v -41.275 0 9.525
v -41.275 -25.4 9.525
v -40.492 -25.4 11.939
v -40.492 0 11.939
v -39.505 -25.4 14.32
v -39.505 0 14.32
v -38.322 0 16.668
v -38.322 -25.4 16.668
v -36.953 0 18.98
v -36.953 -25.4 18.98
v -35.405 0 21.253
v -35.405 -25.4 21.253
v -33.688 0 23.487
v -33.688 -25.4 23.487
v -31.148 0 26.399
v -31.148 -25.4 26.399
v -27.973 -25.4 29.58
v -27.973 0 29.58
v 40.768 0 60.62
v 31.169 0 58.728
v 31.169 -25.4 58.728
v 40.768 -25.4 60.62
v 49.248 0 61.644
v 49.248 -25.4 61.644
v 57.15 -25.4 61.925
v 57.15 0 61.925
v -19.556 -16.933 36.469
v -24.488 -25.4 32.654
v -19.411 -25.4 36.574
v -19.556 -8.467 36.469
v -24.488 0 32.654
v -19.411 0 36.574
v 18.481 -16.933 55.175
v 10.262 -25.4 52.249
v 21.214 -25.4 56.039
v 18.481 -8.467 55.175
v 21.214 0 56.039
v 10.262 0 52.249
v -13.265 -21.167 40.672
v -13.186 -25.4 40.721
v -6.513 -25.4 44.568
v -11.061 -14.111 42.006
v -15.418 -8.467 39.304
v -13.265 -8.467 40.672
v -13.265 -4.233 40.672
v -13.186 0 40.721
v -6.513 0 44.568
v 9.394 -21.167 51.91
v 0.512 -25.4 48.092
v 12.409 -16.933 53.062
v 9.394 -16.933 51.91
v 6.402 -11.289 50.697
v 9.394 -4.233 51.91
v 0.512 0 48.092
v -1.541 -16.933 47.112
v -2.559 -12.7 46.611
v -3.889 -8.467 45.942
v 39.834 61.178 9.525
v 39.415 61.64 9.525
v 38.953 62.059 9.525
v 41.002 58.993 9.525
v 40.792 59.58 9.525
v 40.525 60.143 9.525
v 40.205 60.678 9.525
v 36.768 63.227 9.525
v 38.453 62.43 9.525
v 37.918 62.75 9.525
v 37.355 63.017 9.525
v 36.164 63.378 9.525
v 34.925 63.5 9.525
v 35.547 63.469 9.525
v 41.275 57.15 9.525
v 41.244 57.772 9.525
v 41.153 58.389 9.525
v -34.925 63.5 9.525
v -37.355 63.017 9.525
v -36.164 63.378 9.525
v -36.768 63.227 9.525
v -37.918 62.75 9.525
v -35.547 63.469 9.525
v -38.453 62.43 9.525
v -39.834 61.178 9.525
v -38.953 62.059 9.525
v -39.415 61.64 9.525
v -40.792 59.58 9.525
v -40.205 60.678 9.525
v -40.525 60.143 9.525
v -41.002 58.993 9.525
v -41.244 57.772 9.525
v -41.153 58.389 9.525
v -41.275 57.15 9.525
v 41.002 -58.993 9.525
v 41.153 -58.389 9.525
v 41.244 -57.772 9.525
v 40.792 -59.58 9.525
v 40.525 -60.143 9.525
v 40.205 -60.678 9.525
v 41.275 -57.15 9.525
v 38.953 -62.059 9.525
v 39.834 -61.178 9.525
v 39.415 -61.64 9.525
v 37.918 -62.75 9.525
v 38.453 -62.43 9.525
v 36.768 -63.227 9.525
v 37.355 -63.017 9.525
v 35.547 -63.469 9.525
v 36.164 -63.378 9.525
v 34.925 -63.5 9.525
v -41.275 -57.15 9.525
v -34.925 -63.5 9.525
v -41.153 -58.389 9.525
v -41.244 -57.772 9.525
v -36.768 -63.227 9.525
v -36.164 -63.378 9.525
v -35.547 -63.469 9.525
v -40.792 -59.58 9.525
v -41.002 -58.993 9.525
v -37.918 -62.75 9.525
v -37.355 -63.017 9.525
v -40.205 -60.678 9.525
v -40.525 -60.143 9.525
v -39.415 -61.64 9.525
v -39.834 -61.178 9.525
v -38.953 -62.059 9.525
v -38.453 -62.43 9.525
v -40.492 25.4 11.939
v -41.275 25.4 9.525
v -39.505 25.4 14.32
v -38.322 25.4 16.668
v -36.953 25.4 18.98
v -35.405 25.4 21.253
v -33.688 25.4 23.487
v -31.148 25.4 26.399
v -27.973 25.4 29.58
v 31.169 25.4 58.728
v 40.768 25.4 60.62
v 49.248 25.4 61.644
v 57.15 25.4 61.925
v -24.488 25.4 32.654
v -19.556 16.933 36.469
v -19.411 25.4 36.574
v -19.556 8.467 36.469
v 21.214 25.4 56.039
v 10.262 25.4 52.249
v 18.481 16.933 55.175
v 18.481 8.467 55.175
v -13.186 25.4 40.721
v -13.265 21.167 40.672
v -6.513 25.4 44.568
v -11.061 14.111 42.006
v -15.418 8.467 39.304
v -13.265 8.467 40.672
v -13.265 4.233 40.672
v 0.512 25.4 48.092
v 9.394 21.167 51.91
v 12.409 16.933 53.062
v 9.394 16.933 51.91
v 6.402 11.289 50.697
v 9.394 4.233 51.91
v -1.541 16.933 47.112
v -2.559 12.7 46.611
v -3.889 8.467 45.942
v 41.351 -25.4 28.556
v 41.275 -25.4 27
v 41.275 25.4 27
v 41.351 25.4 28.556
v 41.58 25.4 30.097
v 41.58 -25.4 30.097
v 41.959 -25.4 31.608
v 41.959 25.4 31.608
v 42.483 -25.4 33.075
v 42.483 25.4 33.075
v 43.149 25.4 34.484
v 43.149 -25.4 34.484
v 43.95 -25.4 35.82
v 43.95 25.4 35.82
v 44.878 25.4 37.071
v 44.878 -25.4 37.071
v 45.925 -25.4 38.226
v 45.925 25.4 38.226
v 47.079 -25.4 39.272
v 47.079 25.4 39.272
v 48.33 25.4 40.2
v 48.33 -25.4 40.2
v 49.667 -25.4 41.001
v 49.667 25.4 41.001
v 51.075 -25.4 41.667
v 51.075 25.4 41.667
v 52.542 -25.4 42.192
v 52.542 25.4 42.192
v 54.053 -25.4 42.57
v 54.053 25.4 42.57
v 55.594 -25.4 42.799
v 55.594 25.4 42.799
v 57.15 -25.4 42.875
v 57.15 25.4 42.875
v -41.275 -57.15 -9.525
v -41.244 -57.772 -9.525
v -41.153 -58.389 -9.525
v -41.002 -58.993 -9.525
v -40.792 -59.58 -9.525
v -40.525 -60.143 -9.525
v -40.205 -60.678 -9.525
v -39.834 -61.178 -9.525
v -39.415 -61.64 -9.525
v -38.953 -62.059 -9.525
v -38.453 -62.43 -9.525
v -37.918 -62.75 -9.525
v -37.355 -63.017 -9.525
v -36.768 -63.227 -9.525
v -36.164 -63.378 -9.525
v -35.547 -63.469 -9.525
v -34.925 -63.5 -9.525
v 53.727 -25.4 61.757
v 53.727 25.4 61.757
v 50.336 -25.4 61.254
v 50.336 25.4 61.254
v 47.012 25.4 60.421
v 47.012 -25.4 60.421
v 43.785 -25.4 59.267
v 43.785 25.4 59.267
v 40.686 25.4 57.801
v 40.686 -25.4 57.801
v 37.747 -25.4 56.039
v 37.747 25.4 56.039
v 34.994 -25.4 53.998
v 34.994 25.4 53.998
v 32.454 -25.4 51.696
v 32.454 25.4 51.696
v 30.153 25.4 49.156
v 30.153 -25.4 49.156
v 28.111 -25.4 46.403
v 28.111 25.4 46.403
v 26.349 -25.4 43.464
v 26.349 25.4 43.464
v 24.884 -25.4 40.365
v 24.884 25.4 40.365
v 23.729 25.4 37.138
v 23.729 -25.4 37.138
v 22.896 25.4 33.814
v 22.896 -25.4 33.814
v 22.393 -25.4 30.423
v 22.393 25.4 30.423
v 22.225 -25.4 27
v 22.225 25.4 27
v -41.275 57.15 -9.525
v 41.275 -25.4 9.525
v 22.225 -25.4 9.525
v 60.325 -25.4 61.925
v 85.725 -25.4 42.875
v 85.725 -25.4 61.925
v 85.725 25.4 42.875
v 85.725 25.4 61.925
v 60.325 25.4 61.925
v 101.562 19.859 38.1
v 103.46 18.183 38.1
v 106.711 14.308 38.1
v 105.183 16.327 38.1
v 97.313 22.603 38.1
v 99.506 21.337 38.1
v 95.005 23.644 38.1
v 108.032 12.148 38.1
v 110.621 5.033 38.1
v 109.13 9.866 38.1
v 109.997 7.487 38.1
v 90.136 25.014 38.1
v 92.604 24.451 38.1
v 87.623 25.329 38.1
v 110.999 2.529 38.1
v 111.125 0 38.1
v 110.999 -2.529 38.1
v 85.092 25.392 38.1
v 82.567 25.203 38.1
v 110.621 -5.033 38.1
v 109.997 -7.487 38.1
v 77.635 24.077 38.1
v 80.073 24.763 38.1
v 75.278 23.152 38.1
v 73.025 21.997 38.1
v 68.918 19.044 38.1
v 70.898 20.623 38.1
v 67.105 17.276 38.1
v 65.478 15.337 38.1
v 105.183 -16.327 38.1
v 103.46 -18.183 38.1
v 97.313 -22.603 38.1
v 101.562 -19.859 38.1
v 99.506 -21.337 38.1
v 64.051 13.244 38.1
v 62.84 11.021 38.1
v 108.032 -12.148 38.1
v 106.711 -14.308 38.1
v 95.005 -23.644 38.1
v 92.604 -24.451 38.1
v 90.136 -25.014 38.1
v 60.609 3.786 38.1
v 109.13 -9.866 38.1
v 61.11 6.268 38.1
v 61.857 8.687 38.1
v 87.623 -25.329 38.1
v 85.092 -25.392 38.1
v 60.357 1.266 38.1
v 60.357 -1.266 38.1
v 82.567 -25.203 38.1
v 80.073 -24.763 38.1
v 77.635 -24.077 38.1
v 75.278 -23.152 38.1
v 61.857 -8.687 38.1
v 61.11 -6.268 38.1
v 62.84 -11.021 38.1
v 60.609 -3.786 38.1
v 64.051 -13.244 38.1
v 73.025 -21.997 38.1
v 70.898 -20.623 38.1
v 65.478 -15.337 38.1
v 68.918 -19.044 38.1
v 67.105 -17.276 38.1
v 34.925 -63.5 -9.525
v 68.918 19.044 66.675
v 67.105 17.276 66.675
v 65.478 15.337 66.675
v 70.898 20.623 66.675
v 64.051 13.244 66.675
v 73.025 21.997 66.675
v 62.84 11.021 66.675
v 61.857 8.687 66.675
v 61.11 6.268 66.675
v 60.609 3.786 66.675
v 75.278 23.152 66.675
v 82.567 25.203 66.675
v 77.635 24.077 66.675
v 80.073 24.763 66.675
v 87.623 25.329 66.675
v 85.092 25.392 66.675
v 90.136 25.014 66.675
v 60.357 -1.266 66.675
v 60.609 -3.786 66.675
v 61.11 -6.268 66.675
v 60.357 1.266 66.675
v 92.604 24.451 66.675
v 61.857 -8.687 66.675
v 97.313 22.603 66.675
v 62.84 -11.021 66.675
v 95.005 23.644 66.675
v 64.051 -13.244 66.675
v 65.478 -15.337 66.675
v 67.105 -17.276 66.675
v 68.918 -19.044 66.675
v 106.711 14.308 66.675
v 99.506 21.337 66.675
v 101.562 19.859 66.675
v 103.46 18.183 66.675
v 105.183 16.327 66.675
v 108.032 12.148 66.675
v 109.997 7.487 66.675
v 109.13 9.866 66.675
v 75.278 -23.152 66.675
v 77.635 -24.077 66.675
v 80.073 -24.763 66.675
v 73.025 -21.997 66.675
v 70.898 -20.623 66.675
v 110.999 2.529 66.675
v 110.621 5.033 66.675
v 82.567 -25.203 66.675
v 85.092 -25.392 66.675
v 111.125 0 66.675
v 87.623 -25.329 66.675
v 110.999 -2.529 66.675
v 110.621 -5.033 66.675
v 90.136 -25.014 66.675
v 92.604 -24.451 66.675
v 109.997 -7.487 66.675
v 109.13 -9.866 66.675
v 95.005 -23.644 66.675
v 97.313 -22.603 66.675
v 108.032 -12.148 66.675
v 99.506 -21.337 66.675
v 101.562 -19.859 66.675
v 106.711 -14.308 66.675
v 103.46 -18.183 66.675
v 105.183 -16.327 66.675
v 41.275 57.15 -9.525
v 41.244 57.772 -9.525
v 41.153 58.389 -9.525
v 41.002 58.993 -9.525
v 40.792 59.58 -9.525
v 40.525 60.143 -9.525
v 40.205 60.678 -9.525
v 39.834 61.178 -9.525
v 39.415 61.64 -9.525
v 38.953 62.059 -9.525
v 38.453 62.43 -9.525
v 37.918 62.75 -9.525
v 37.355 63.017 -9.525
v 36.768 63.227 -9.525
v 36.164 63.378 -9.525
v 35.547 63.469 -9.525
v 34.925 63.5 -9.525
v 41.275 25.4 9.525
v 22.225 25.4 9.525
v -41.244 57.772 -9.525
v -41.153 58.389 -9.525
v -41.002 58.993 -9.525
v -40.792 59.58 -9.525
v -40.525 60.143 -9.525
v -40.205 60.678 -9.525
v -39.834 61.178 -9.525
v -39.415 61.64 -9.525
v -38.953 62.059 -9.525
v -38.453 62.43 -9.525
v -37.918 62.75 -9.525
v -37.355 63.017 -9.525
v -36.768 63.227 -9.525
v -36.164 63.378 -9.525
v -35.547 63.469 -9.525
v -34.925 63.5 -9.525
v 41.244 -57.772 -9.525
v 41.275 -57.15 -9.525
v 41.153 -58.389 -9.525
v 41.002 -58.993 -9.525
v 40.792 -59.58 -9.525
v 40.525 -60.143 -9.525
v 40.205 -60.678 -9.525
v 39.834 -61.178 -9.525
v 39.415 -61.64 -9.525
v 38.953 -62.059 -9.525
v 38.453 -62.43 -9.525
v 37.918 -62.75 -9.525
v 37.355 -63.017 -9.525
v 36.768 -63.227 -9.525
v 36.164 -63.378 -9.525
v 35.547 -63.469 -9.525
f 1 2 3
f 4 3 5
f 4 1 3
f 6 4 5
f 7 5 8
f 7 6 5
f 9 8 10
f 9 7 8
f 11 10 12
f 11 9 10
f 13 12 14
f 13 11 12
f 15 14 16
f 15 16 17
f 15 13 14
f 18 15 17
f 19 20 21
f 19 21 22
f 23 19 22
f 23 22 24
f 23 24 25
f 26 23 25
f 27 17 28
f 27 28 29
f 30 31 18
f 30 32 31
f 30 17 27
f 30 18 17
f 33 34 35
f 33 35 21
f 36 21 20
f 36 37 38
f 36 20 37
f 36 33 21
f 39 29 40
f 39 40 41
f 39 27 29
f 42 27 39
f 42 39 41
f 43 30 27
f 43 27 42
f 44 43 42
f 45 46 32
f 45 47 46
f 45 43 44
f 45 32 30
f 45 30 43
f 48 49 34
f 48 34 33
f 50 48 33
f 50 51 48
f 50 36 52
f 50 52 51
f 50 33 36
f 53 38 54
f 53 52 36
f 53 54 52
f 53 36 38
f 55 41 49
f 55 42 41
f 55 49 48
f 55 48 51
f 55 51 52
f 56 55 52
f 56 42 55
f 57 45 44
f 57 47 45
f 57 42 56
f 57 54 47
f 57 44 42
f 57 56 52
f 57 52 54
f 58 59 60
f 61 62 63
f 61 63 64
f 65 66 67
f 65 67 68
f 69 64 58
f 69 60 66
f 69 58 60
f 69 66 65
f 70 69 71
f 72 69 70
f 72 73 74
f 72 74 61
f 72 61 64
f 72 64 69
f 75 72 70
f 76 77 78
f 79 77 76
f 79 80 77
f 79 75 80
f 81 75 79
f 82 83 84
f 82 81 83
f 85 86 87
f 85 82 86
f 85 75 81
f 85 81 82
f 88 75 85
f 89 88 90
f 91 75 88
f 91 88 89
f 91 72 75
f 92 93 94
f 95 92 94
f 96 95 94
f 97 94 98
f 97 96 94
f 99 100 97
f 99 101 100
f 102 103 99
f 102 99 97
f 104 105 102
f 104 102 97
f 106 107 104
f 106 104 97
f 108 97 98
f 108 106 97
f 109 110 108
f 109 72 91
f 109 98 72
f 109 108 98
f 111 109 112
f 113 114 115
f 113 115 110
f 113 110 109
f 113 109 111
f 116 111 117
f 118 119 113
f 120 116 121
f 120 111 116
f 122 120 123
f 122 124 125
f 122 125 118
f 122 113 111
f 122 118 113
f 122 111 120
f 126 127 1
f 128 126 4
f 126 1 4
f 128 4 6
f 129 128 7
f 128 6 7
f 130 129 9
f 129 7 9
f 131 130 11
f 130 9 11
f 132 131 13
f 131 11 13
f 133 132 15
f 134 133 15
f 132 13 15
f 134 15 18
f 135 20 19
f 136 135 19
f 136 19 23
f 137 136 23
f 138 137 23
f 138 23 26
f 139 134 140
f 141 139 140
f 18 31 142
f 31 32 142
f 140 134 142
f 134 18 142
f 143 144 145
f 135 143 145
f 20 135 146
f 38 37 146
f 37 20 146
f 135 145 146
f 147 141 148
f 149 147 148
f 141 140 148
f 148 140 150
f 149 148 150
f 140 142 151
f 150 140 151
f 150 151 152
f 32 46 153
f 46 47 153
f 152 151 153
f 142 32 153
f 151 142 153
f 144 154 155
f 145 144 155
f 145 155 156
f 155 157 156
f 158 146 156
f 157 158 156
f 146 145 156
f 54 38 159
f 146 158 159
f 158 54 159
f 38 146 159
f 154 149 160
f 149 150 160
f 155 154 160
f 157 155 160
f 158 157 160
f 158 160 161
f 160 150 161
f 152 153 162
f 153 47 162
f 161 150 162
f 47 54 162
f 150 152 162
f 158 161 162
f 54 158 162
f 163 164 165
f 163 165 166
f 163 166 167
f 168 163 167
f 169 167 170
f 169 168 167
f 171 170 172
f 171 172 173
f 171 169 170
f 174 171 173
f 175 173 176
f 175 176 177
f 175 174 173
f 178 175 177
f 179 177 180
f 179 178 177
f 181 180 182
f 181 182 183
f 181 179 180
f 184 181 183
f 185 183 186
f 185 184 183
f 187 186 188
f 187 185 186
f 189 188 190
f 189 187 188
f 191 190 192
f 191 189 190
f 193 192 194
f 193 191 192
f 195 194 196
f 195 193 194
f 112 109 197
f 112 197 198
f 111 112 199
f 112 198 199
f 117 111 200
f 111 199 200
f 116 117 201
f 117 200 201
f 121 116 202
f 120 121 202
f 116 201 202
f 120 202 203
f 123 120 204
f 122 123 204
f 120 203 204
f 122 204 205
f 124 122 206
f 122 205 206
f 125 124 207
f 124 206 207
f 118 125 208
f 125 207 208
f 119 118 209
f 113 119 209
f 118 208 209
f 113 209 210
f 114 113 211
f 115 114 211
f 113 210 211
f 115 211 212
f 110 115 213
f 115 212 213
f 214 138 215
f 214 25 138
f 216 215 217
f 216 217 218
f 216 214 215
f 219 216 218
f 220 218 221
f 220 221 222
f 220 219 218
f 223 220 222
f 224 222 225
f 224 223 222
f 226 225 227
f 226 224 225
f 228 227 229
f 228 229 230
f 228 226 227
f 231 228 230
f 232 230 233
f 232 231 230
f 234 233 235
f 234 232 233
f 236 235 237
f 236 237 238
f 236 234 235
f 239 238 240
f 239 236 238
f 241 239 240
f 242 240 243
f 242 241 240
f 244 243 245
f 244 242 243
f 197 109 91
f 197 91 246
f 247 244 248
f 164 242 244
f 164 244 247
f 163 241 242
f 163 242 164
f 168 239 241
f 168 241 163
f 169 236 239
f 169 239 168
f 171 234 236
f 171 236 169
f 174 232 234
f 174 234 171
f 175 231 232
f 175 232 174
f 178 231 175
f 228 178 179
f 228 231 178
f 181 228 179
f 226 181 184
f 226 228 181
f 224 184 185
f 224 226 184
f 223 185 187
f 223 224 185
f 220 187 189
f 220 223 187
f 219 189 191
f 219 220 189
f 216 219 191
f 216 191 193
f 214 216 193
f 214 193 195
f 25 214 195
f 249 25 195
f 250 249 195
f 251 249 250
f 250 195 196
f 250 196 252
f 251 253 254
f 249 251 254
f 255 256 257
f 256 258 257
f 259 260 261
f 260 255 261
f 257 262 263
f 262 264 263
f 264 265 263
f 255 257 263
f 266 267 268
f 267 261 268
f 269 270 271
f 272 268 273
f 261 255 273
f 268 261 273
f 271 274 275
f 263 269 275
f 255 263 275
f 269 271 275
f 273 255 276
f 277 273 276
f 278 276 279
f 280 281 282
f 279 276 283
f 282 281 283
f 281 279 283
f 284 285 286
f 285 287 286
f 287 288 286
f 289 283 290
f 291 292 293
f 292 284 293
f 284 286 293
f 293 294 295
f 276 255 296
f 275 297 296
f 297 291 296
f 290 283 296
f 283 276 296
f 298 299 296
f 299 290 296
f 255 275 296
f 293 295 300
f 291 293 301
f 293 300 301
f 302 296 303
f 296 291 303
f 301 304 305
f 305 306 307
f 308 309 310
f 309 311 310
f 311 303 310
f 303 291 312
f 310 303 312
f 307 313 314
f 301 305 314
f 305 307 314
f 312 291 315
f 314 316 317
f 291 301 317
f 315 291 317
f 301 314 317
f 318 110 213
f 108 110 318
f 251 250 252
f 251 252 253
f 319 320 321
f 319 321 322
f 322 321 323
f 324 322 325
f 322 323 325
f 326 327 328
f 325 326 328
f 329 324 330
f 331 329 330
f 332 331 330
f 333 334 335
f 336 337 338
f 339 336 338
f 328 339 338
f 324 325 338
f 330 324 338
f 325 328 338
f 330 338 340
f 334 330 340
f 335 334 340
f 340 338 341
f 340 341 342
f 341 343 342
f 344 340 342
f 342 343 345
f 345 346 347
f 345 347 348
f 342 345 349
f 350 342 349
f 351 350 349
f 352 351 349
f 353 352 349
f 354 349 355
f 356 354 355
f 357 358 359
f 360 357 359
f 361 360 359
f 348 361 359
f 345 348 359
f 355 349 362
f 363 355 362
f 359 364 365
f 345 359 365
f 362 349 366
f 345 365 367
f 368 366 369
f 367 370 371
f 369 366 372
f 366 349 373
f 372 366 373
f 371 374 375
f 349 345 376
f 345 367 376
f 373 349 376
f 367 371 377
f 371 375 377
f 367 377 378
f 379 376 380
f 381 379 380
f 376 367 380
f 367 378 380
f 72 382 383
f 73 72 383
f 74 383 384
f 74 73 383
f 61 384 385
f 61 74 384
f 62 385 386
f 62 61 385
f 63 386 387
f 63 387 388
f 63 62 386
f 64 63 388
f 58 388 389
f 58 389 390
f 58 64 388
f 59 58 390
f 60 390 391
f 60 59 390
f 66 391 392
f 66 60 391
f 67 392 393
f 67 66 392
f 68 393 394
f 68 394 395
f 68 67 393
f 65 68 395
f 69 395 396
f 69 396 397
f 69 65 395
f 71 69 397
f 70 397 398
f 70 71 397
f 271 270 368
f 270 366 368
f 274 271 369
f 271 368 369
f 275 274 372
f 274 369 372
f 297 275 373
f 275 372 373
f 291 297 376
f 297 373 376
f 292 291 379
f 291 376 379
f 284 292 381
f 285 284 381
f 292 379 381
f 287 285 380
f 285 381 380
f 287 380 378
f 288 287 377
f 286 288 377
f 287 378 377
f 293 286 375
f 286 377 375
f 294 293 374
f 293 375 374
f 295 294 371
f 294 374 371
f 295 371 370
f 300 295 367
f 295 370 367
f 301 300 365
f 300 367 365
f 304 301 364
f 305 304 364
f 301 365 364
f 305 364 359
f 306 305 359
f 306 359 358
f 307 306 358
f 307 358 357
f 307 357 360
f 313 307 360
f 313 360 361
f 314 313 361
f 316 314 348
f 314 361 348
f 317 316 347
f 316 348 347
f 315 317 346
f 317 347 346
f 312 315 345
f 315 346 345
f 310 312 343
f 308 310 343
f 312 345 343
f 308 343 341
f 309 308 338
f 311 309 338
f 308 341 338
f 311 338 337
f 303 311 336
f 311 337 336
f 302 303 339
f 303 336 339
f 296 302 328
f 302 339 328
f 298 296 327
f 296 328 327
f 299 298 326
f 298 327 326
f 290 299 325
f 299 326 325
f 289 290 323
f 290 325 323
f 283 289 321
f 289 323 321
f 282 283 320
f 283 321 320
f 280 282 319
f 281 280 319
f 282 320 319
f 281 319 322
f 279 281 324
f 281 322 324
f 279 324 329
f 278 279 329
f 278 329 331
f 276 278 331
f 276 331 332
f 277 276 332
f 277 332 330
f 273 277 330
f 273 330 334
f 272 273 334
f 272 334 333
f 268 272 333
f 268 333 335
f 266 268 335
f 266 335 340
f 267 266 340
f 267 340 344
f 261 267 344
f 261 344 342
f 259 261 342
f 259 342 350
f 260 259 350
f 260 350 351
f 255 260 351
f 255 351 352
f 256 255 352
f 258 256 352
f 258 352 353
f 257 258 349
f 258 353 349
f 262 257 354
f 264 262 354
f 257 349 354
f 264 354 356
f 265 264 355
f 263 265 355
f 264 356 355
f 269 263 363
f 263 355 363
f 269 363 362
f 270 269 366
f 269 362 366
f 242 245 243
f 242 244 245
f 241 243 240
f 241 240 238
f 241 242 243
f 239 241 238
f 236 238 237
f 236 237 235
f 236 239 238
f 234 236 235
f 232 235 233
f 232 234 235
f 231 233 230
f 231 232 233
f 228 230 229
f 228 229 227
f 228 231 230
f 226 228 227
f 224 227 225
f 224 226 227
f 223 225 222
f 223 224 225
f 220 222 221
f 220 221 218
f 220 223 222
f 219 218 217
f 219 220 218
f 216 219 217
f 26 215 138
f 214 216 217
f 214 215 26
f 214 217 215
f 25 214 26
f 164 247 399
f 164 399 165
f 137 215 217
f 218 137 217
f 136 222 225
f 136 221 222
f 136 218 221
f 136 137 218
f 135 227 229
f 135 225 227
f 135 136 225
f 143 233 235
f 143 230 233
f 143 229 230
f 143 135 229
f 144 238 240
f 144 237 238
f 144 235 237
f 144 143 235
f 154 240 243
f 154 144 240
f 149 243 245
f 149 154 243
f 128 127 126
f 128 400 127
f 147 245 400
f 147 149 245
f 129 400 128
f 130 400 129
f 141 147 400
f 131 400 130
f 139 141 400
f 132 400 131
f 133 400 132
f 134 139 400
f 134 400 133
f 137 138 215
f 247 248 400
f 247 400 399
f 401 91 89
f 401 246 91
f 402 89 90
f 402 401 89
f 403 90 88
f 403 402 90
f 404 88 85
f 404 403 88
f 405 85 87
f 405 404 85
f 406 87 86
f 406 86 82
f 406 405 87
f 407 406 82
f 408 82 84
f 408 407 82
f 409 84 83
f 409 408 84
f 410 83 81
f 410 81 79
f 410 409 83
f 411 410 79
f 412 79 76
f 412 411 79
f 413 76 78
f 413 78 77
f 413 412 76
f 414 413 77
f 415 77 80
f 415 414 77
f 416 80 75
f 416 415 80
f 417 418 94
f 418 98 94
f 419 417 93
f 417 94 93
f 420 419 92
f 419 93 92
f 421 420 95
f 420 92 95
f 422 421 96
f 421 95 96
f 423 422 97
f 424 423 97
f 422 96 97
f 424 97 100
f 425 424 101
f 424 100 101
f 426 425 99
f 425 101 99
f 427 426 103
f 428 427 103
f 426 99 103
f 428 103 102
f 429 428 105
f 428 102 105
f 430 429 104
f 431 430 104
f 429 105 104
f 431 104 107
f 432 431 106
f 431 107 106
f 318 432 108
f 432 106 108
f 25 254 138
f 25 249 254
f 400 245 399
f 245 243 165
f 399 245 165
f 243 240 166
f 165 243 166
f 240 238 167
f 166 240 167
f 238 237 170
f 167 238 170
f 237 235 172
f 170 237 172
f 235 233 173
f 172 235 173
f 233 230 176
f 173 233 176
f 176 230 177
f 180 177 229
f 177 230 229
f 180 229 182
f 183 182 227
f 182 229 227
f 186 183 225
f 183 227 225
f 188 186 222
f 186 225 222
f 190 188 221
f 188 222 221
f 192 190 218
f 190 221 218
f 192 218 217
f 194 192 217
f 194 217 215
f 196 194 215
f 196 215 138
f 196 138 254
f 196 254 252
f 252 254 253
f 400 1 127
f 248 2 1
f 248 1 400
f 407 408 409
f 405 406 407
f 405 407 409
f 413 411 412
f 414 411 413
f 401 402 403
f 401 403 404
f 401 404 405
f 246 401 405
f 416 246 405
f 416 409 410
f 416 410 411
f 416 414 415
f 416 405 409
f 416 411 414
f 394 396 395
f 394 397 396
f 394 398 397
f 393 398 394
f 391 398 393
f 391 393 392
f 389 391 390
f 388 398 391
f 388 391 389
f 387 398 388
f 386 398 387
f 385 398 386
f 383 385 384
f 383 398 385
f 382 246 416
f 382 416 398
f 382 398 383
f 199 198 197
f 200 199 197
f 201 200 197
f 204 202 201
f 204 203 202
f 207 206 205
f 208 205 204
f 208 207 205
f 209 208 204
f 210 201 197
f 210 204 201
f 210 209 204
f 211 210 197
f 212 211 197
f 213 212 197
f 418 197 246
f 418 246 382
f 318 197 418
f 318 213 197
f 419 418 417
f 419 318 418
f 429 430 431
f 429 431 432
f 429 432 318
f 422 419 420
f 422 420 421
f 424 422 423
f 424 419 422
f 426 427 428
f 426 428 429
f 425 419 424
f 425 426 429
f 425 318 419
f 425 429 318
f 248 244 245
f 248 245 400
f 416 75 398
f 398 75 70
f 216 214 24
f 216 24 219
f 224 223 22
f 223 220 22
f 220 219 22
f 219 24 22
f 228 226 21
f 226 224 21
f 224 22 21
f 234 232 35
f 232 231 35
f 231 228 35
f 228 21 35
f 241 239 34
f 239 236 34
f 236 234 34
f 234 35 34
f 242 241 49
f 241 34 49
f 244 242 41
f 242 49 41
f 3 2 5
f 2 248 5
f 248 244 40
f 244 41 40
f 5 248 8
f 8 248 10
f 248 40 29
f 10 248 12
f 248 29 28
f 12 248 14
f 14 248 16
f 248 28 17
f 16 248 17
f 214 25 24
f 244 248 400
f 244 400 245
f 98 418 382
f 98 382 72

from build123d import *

# Parameters (mm, degrees)
F1_DEPTH = 63.5
F2_DEPTH = 25.4
F3_DEPTH = 25.4
F5_R     = 6.35


# Not quite as in the source:
# - ends of sketch curves that miss each other by under 0.0002 mm in the source are joined
# - a feature names something its author has since deleted; it is built from what else it names


with BuildPart() as f1:
    # F0 (on Front) → F1 (new body, symmetric)
    with BuildSketch(Plane.XZ):
        Polygon((-41.275, 9.525), (-41.275, -9.525), (41.275, -9.525), (41.275, 9.525), (22.2250005586, 9.525), align=None)
    extrude(amount=F1_DEPTH, both=True)

    # F5
    f5_edges = [f1.edges().sort_by_distance(p)[0] for p in [
        (-41.275, -63.5, 0),
        (41.275, -63.5, 0),
        (41.275, 63.5, 0),
        (-41.275, 63.5, 0),
    ]]
    fillet(f5_edges, radius=F5_R)


with BuildPart() as f2:
    # F0 (on Front) → F2 (new body, symmetric)
    with BuildSketch(Plane.XZ):
        with BuildLine():
            Line((22.2250005586, 9.525), (41.275, 9.525))
            Line((41.275, 9.525), (41.275, 27.0002))
            ThreePointArc((41.275, 27.0002), (45.9246798487, 38.2255201513), (57.15, 42.8752))
            Line((57.15, 42.8752), (60.325, 42.8752))
            Line((60.325, 42.8752), (60.325, 61.9251994414))
            Line((60.325, 61.9251994414), (57.15, 61.9251988828))
            ThreePointArc((57.15, 61.9251988828), (32.454296457, 51.695903543), (22.2250011172, 27.0002))
            Line((22.2250011172, 27.0002), (22.2250005586, 9.525))
        make_face()
        Polygon((67.4121566832, 61.9251988828), (60.325, 61.9251988828), (60.325, 42.8752), (85.725, 42.8752), (85.725, 61.9251988828), align=None)
    extrude(amount=F2_DEPTH, both=True)


with BuildPart() as f3:
    # F0 (on Front) → F3 (new body, symmetric)
    with BuildSketch(Plane.XZ):
        with BuildLine():
            add(Edge.make_bspline(
                [(-41.275, 9.525), (-32.9427421093, 39.3494740129), (23.3934521675, 62.3923577368), (57.15, 61.9251988828)],
                knots=[0, 0, 0, 0, 111.5045356385, 111.5045356385, 111.5045356385, 111.5045356385], degree=3))
            Line((-41.275, 9.525), (22.2250005586, 9.525))
            Line((22.2250005586, 9.525), (22.2250011172, 27.0002))
            ThreePointArc((22.2250011172, 27.0002), (32.454296457, 51.695903543), (57.15, 61.9251988828))
        make_face()
    extrude(amount=F3_DEPTH, both=True)


with BuildPart() as f4:
    # F0 (on Front) → F4 (revolve)
    with BuildSketch(Plane.XZ):
        Polygon((85.725, 66.675), (85.725, 61.9251988828), (85.725, 42.8752), (85.725, 38.1), (111.125, 38.1), (111.125, 66.675), align=None)
    revolve(axis=Axis((85.725, 0, 52.4001994414), (0, 0, -1)))


solid = Compound([f1.part, f2.part, f3.part, f4.part])
